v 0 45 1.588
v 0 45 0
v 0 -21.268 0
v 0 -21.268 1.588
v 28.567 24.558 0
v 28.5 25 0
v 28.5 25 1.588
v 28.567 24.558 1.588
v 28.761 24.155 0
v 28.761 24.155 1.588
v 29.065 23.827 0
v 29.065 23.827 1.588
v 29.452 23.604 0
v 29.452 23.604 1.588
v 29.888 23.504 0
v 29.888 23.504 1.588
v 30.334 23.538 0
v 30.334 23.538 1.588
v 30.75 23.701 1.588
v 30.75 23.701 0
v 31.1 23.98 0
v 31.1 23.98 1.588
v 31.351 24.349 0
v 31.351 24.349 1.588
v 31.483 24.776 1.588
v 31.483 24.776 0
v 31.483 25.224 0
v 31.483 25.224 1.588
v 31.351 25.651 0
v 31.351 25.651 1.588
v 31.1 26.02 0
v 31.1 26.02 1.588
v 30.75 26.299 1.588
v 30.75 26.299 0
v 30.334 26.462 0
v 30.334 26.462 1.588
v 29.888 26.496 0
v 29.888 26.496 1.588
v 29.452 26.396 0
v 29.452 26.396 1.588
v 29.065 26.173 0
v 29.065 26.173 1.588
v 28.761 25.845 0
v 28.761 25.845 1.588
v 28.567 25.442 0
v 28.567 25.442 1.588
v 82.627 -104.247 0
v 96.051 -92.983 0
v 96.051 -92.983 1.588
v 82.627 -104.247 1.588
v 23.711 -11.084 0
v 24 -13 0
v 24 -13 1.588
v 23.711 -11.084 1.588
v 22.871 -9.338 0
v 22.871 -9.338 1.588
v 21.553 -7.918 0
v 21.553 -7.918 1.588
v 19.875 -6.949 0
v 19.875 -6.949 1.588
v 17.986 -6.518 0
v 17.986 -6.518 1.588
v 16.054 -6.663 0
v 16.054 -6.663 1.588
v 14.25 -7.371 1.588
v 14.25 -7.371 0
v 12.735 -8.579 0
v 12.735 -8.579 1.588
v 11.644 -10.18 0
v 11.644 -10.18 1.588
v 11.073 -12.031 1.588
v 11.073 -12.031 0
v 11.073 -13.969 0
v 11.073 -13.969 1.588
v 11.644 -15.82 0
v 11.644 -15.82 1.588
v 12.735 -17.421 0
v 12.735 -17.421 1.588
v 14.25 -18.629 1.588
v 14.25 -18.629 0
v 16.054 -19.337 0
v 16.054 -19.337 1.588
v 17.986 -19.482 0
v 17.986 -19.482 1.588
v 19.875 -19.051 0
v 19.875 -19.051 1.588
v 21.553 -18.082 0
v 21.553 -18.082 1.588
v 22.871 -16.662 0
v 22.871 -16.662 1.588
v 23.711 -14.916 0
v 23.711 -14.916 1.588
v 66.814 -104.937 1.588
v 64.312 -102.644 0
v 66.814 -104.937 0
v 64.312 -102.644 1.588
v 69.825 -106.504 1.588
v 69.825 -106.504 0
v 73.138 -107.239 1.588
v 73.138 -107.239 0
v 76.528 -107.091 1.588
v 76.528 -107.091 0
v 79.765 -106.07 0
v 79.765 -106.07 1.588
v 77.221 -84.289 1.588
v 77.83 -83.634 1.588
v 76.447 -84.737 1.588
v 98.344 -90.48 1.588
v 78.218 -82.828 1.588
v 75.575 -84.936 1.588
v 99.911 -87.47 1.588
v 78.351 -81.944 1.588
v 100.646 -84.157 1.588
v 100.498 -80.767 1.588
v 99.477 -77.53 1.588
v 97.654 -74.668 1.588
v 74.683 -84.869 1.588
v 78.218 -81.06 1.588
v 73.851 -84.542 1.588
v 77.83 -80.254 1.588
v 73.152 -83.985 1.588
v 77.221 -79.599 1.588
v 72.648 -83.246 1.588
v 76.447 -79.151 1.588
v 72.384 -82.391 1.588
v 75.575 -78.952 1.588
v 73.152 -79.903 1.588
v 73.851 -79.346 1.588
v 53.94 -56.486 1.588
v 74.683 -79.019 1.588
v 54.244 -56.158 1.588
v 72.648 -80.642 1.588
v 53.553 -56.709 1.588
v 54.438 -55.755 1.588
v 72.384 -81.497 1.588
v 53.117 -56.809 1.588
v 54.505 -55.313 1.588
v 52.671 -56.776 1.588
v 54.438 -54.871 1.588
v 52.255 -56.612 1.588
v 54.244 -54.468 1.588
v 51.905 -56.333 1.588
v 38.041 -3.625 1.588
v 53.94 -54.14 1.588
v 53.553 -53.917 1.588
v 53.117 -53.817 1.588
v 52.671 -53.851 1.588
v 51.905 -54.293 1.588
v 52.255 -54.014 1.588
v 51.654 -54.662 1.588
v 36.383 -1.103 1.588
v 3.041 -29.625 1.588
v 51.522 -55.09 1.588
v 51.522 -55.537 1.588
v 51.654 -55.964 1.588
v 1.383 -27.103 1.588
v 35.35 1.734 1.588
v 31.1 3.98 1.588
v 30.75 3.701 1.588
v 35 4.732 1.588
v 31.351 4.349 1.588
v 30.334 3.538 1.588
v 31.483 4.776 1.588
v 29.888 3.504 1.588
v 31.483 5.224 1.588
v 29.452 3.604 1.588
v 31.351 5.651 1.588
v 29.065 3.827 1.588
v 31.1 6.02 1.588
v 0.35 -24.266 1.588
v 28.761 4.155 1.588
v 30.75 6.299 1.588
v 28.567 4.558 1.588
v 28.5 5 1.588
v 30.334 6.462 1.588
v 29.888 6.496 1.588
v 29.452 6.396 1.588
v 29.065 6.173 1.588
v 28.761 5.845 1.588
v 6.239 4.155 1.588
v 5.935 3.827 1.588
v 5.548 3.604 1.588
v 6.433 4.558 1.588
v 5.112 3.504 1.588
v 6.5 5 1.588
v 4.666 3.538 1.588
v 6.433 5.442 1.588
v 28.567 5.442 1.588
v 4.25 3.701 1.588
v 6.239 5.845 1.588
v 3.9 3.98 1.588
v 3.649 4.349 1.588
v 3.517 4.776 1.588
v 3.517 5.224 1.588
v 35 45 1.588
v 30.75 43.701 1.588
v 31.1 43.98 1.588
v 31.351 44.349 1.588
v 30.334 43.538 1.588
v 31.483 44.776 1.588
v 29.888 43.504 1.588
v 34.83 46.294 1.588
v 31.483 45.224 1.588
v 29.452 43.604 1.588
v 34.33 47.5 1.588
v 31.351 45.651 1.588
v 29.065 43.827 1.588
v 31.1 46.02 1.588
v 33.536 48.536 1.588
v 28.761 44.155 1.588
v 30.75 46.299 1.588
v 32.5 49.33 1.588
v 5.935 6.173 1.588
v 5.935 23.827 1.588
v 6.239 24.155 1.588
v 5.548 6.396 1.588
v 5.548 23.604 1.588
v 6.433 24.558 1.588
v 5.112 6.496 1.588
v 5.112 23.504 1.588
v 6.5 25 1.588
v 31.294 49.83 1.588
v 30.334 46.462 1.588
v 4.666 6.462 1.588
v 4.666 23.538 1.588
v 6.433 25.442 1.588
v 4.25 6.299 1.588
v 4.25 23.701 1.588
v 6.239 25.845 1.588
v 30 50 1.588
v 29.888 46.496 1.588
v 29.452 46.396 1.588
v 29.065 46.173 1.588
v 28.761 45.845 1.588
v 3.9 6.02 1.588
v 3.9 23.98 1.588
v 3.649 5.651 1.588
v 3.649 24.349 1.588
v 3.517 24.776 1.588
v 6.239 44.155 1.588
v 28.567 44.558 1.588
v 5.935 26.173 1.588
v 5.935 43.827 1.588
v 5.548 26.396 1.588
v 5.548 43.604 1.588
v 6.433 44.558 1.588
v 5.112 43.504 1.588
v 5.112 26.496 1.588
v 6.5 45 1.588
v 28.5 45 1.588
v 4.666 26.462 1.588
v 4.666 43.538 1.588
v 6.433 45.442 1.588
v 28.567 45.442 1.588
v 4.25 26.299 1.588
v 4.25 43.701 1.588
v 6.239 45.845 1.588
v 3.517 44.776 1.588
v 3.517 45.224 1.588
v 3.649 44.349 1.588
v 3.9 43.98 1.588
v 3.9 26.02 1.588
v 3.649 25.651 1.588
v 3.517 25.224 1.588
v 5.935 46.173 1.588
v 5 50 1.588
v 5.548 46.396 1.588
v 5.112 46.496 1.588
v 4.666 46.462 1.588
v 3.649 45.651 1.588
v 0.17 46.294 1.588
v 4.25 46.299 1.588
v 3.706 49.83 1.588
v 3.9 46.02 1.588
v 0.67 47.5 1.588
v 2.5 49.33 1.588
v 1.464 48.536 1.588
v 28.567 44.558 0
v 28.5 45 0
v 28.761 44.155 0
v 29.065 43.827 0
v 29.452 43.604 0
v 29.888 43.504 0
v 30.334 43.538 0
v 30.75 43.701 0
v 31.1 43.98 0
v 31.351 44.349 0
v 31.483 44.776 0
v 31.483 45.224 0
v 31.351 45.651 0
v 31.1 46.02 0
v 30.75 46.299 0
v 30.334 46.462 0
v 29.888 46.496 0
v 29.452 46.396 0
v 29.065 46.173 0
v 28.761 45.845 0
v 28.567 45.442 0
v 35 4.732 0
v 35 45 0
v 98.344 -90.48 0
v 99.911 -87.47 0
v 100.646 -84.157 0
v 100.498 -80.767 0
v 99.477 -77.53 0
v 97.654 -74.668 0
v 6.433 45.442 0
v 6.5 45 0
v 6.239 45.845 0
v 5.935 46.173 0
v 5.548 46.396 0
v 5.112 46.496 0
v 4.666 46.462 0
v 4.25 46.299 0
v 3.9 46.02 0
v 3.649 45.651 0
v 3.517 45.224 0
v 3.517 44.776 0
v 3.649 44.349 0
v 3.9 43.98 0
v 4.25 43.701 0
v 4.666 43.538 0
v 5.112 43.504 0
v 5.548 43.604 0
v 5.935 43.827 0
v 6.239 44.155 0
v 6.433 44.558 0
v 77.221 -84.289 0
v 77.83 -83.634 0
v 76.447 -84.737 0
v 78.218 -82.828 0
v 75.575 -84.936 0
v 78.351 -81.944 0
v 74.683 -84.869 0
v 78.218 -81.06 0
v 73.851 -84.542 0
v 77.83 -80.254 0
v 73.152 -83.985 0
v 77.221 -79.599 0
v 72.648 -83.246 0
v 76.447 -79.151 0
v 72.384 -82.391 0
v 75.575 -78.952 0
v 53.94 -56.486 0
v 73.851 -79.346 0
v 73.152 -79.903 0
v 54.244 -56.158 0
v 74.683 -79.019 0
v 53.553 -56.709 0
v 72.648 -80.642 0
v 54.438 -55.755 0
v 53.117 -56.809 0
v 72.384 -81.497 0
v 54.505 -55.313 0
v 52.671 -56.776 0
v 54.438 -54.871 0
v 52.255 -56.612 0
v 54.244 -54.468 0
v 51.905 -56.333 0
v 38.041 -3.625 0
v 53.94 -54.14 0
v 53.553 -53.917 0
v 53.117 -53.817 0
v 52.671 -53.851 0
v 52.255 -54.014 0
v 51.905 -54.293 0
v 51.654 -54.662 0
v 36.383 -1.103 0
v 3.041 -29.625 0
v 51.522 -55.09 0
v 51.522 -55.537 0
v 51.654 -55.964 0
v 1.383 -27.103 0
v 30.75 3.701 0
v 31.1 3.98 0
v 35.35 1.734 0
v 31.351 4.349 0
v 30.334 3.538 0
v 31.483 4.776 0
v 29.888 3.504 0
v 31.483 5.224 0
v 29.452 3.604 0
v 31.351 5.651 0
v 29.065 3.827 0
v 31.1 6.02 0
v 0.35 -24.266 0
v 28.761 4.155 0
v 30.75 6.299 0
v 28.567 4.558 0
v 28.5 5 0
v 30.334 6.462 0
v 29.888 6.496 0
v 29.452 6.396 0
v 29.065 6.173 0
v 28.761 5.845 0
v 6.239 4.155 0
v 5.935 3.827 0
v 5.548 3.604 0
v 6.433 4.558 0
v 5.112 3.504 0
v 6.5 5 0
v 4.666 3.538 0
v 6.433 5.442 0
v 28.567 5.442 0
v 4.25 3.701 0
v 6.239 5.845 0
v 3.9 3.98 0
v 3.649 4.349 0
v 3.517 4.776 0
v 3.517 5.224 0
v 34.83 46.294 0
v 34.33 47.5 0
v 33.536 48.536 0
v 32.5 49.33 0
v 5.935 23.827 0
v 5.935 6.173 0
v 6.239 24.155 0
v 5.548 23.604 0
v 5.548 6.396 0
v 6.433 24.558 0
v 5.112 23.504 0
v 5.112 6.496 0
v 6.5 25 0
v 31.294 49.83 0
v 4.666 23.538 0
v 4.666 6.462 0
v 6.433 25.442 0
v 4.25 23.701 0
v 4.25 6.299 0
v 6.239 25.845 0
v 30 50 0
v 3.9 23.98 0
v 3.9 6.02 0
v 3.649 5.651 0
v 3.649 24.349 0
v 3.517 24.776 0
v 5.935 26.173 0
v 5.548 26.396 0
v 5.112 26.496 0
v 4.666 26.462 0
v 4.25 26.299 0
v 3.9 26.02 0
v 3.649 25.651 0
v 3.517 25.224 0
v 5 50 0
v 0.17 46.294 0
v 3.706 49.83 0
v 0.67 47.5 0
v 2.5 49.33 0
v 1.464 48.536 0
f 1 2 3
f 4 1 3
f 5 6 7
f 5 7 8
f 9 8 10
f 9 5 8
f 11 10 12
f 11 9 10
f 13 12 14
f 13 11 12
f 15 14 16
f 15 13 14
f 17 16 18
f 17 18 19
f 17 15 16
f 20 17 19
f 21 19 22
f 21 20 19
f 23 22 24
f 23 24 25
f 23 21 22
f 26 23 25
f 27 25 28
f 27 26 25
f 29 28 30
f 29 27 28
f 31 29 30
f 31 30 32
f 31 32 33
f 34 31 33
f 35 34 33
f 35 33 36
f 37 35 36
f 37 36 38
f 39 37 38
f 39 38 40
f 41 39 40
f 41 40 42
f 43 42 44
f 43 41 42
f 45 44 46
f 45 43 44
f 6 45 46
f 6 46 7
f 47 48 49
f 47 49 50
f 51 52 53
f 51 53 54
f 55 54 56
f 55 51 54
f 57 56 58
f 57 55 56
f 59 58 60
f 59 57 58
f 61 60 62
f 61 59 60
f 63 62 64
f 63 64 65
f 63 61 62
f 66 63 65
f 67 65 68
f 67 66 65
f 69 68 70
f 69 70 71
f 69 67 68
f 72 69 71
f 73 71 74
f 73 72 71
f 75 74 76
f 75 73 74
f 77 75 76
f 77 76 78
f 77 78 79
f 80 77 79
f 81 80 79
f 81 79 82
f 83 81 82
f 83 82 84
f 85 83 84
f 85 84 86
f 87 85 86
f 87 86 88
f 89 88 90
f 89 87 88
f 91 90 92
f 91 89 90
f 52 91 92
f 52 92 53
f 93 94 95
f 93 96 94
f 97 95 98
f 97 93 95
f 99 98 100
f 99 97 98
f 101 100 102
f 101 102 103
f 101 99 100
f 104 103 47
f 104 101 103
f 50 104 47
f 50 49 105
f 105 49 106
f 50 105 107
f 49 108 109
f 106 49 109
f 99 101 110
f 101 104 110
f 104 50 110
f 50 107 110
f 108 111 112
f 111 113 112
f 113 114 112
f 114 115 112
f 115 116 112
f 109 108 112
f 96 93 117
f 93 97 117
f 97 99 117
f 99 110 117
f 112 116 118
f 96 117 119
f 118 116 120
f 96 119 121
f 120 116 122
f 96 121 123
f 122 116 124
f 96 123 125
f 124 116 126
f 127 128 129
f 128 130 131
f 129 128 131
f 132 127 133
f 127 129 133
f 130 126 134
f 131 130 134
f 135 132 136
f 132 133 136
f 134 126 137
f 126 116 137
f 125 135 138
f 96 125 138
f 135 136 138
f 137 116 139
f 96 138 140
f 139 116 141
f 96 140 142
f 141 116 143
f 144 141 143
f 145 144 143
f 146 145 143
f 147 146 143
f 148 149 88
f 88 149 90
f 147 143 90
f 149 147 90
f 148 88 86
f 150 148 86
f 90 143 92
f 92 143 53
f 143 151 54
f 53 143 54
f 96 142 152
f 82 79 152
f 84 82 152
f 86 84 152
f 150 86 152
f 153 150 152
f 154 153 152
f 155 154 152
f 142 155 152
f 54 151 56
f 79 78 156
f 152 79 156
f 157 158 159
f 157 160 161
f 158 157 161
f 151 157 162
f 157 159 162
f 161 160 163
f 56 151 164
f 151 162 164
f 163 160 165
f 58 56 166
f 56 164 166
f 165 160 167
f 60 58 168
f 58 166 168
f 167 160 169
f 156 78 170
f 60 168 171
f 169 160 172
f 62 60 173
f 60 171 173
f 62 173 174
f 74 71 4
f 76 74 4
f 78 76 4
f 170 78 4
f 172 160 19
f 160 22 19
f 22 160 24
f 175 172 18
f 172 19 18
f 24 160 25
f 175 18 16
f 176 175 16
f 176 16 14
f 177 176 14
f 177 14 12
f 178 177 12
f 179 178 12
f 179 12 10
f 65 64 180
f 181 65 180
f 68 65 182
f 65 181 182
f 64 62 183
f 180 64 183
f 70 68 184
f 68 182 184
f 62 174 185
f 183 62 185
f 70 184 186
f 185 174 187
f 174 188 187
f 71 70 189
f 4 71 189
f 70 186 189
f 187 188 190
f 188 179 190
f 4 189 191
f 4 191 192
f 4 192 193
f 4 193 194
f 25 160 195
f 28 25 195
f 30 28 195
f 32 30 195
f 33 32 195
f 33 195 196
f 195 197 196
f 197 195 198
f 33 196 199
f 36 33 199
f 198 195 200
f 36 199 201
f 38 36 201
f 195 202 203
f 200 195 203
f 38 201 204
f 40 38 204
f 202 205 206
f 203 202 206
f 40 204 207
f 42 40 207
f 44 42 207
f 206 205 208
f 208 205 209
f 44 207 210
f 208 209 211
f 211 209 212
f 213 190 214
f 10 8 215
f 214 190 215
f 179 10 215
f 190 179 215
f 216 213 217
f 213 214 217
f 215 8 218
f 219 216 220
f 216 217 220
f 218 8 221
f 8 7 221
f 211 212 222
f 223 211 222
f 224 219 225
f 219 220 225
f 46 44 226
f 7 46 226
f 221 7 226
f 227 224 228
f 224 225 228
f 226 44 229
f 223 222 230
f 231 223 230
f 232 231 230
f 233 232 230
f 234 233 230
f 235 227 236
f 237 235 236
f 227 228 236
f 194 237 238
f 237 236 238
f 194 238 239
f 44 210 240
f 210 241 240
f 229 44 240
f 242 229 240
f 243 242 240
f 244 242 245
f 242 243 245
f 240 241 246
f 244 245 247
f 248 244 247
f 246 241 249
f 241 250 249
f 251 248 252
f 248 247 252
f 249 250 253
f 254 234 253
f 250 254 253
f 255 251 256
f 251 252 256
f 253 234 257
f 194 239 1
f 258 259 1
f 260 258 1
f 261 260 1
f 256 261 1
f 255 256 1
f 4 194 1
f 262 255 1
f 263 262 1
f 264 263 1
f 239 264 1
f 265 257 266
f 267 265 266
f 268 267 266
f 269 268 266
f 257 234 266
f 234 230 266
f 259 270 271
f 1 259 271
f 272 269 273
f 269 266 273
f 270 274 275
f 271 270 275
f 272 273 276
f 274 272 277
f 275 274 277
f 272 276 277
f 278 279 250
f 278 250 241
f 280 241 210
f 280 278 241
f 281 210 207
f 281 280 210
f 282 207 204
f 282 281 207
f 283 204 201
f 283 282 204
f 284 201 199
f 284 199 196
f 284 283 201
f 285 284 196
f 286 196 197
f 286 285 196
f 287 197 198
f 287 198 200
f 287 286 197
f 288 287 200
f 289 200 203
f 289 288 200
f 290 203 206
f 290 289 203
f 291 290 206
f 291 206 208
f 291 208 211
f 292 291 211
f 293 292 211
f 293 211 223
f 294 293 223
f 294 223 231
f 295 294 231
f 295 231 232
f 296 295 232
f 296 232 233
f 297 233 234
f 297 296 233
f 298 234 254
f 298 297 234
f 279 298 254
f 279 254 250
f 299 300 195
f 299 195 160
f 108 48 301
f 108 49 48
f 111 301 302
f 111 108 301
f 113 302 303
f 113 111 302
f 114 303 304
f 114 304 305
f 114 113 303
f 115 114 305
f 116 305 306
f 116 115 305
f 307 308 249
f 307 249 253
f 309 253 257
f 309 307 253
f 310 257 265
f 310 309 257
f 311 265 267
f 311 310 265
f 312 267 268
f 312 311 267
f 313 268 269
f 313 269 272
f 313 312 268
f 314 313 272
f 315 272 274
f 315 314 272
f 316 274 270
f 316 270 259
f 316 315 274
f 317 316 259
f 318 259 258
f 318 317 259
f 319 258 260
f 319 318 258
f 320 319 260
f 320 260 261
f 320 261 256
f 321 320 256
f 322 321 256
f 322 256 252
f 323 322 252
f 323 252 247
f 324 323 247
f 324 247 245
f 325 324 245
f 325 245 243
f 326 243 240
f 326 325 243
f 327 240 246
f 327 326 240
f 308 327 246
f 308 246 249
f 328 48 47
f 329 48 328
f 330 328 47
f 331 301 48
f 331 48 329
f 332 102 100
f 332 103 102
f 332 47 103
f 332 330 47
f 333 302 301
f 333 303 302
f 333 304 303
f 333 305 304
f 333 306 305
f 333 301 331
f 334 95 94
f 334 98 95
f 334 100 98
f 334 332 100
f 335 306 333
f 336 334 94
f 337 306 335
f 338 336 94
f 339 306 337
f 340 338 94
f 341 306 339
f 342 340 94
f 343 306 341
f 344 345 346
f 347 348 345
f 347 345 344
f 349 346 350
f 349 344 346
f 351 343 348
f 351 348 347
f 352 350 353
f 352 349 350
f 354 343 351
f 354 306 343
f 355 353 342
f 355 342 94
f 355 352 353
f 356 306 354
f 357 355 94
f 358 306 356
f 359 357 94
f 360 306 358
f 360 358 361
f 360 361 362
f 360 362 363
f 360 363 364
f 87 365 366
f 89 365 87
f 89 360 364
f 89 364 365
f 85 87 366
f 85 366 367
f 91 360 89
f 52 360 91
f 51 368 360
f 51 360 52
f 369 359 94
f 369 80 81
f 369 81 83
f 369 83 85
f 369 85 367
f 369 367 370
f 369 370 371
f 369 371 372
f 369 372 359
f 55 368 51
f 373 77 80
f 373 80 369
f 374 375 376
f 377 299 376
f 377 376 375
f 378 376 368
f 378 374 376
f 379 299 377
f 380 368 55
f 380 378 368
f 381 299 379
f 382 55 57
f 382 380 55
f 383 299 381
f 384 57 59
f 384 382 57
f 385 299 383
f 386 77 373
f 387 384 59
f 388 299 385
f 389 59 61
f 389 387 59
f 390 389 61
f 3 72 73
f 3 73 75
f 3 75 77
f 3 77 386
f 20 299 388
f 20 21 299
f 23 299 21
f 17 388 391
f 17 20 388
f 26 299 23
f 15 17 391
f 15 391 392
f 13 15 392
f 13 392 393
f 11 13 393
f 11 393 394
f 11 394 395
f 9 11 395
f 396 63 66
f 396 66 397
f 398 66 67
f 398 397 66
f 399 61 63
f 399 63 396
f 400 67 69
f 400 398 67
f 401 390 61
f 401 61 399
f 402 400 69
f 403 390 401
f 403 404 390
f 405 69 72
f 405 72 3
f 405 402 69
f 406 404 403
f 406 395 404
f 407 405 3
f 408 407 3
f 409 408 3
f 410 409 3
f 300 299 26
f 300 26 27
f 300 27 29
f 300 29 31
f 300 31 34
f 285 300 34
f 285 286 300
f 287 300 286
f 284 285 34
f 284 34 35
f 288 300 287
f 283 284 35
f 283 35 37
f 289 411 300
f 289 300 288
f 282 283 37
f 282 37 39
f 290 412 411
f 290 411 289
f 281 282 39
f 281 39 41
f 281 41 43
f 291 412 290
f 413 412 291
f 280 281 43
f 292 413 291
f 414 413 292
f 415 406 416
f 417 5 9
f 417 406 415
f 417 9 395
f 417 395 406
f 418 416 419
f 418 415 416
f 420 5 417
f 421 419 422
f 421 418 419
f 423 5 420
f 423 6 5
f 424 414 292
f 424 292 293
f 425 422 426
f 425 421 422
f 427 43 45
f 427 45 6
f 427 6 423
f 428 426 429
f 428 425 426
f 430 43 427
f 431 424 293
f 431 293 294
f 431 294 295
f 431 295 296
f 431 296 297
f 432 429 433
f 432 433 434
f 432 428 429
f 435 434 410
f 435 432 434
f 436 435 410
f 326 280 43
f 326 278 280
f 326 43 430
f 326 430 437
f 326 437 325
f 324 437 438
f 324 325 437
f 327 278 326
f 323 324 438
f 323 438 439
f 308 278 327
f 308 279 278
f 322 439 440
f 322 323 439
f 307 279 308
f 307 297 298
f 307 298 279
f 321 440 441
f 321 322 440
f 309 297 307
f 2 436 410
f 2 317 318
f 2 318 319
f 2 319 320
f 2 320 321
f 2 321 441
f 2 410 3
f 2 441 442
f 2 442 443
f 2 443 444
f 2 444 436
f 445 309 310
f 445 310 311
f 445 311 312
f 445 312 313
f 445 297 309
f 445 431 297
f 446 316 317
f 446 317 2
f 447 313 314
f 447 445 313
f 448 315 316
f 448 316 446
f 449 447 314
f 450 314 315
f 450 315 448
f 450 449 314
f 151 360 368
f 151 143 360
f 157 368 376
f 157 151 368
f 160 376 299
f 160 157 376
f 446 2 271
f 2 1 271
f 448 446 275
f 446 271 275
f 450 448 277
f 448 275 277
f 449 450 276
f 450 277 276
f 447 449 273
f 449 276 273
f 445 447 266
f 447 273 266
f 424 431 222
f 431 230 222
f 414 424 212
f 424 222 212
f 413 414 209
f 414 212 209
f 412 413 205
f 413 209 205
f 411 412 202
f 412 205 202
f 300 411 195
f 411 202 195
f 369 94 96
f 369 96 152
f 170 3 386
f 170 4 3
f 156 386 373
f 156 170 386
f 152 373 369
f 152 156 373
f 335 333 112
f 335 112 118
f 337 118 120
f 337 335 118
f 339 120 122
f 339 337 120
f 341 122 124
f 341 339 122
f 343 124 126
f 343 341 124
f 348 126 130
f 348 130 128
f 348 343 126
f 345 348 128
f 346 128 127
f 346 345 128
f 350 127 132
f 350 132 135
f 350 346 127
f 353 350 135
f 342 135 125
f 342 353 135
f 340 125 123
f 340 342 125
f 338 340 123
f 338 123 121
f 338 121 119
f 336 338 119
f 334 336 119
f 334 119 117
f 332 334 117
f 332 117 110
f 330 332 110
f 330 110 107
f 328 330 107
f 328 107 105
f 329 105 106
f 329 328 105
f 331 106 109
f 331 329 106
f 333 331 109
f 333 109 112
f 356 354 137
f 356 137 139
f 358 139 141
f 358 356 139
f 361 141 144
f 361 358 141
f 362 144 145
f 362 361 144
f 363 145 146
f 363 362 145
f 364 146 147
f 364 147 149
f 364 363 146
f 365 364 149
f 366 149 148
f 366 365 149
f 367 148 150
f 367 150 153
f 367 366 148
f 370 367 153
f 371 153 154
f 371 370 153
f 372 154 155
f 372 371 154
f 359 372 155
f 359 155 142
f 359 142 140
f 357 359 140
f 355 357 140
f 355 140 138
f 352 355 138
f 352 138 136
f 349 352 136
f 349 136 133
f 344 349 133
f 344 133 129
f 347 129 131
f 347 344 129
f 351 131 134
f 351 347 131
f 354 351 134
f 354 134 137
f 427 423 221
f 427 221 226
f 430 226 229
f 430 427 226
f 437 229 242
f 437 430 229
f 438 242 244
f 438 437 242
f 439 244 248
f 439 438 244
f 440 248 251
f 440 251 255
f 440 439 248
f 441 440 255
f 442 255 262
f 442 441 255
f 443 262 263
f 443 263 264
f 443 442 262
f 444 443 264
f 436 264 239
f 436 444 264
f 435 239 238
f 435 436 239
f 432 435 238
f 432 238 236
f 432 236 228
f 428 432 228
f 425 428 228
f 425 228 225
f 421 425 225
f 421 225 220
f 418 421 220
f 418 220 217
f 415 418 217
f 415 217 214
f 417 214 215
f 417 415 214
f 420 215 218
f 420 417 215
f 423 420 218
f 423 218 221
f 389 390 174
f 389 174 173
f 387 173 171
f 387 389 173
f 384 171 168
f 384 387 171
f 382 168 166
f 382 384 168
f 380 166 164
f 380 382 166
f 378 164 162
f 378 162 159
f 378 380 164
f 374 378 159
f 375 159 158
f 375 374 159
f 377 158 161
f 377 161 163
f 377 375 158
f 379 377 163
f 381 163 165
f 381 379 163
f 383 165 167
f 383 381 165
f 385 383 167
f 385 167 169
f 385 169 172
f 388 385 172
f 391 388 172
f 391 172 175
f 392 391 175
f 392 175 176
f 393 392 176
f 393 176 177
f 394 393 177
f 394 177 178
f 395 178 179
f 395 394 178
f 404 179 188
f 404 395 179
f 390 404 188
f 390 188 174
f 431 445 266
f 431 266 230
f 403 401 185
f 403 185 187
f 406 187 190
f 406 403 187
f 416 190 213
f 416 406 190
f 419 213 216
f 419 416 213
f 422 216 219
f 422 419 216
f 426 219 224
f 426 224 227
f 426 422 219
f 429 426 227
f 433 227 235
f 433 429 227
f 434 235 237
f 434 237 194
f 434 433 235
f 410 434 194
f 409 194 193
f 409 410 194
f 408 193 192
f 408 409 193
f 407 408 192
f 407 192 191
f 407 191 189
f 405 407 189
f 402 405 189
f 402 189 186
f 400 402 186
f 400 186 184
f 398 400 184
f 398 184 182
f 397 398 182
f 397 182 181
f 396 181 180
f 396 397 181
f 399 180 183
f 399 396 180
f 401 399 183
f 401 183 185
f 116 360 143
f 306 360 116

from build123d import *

# Parameters (mm, degrees)
SKETCH1_R           = 6.5
SKETCH1_R_2         = 1.5
SKETCH1_R_3         = 3
BOSS_EXTRUDE1_DEPTH = 1.5875
FILLET1_R           = 5
FILLET2_R           = 13


with BuildPart() as part:
    # Sketch1 → Boss-Extrude1 (new body)
    with BuildSketch(Plane.XY):
        Polygon((0, 0), (0, 50), (35, 50), (35, 0), (106.009911505, -84.626317146), (72.668567607, -112.603026514), (0, -26), align=None)
        with Locations((17.5, -13)):
            Circle(SKETCH1_R, mode=Mode.SUBTRACT)
        with Locations((5, 45)):
            Circle(SKETCH1_R_2, mode=Mode.SUBTRACT)
        with Locations((5, 25)):
            Circle(SKETCH1_R_2, mode=Mode.SUBTRACT)
        with Locations((5, 5)):
            Circle(SKETCH1_R_2, mode=Mode.SUBTRACT)
        with Locations(Location((30, 5, 0), (0, 0, 180))):
            Circle(SKETCH1_R_2, mode=Mode.SUBTRACT)
        with Locations(Location((30, 25, 0), (0, 0, 180))):
            Circle(SKETCH1_R_2, mode=Mode.SUBTRACT)
        with Locations(Location((30, 45, 0), (0, 0, 180))):
            Circle(SKETCH1_R_2, mode=Mode.SUBTRACT)
        with Locations((75.350884872, -81.943999881)):
            Circle(SKETCH1_R_3, mode=Mode.SUBTRACT)
        with Locations((53.004955752, -55.313158573)):
            Circle(SKETCH1_R_2, mode=Mode.SUBTRACT)
    extrude(amount=BOSS_EXTRUDE1_DEPTH)

    # Fillet1
    fillet1_edges = [part.edges().sort_by_distance(p)[0] for p in [
        (0, 50, 0.79375),
        (35, 50, 0.79375),
    ]]
    fillet(fillet1_edges, radius=FILLET1_R)

    # Fillet2
    fillet2_edges = [part.edges().sort_by_distance(p)[0] for p in [
        (35, 0, 0.79375),
        (106.009911505, -84.626317146, 0.79375),
        (72.668567607, -112.603026514, 0.79375),
        (0, -26, 0.79375),
    ]]
    fillet(fillet2_edges, radius=FILLET2_R)


solid = part.part
